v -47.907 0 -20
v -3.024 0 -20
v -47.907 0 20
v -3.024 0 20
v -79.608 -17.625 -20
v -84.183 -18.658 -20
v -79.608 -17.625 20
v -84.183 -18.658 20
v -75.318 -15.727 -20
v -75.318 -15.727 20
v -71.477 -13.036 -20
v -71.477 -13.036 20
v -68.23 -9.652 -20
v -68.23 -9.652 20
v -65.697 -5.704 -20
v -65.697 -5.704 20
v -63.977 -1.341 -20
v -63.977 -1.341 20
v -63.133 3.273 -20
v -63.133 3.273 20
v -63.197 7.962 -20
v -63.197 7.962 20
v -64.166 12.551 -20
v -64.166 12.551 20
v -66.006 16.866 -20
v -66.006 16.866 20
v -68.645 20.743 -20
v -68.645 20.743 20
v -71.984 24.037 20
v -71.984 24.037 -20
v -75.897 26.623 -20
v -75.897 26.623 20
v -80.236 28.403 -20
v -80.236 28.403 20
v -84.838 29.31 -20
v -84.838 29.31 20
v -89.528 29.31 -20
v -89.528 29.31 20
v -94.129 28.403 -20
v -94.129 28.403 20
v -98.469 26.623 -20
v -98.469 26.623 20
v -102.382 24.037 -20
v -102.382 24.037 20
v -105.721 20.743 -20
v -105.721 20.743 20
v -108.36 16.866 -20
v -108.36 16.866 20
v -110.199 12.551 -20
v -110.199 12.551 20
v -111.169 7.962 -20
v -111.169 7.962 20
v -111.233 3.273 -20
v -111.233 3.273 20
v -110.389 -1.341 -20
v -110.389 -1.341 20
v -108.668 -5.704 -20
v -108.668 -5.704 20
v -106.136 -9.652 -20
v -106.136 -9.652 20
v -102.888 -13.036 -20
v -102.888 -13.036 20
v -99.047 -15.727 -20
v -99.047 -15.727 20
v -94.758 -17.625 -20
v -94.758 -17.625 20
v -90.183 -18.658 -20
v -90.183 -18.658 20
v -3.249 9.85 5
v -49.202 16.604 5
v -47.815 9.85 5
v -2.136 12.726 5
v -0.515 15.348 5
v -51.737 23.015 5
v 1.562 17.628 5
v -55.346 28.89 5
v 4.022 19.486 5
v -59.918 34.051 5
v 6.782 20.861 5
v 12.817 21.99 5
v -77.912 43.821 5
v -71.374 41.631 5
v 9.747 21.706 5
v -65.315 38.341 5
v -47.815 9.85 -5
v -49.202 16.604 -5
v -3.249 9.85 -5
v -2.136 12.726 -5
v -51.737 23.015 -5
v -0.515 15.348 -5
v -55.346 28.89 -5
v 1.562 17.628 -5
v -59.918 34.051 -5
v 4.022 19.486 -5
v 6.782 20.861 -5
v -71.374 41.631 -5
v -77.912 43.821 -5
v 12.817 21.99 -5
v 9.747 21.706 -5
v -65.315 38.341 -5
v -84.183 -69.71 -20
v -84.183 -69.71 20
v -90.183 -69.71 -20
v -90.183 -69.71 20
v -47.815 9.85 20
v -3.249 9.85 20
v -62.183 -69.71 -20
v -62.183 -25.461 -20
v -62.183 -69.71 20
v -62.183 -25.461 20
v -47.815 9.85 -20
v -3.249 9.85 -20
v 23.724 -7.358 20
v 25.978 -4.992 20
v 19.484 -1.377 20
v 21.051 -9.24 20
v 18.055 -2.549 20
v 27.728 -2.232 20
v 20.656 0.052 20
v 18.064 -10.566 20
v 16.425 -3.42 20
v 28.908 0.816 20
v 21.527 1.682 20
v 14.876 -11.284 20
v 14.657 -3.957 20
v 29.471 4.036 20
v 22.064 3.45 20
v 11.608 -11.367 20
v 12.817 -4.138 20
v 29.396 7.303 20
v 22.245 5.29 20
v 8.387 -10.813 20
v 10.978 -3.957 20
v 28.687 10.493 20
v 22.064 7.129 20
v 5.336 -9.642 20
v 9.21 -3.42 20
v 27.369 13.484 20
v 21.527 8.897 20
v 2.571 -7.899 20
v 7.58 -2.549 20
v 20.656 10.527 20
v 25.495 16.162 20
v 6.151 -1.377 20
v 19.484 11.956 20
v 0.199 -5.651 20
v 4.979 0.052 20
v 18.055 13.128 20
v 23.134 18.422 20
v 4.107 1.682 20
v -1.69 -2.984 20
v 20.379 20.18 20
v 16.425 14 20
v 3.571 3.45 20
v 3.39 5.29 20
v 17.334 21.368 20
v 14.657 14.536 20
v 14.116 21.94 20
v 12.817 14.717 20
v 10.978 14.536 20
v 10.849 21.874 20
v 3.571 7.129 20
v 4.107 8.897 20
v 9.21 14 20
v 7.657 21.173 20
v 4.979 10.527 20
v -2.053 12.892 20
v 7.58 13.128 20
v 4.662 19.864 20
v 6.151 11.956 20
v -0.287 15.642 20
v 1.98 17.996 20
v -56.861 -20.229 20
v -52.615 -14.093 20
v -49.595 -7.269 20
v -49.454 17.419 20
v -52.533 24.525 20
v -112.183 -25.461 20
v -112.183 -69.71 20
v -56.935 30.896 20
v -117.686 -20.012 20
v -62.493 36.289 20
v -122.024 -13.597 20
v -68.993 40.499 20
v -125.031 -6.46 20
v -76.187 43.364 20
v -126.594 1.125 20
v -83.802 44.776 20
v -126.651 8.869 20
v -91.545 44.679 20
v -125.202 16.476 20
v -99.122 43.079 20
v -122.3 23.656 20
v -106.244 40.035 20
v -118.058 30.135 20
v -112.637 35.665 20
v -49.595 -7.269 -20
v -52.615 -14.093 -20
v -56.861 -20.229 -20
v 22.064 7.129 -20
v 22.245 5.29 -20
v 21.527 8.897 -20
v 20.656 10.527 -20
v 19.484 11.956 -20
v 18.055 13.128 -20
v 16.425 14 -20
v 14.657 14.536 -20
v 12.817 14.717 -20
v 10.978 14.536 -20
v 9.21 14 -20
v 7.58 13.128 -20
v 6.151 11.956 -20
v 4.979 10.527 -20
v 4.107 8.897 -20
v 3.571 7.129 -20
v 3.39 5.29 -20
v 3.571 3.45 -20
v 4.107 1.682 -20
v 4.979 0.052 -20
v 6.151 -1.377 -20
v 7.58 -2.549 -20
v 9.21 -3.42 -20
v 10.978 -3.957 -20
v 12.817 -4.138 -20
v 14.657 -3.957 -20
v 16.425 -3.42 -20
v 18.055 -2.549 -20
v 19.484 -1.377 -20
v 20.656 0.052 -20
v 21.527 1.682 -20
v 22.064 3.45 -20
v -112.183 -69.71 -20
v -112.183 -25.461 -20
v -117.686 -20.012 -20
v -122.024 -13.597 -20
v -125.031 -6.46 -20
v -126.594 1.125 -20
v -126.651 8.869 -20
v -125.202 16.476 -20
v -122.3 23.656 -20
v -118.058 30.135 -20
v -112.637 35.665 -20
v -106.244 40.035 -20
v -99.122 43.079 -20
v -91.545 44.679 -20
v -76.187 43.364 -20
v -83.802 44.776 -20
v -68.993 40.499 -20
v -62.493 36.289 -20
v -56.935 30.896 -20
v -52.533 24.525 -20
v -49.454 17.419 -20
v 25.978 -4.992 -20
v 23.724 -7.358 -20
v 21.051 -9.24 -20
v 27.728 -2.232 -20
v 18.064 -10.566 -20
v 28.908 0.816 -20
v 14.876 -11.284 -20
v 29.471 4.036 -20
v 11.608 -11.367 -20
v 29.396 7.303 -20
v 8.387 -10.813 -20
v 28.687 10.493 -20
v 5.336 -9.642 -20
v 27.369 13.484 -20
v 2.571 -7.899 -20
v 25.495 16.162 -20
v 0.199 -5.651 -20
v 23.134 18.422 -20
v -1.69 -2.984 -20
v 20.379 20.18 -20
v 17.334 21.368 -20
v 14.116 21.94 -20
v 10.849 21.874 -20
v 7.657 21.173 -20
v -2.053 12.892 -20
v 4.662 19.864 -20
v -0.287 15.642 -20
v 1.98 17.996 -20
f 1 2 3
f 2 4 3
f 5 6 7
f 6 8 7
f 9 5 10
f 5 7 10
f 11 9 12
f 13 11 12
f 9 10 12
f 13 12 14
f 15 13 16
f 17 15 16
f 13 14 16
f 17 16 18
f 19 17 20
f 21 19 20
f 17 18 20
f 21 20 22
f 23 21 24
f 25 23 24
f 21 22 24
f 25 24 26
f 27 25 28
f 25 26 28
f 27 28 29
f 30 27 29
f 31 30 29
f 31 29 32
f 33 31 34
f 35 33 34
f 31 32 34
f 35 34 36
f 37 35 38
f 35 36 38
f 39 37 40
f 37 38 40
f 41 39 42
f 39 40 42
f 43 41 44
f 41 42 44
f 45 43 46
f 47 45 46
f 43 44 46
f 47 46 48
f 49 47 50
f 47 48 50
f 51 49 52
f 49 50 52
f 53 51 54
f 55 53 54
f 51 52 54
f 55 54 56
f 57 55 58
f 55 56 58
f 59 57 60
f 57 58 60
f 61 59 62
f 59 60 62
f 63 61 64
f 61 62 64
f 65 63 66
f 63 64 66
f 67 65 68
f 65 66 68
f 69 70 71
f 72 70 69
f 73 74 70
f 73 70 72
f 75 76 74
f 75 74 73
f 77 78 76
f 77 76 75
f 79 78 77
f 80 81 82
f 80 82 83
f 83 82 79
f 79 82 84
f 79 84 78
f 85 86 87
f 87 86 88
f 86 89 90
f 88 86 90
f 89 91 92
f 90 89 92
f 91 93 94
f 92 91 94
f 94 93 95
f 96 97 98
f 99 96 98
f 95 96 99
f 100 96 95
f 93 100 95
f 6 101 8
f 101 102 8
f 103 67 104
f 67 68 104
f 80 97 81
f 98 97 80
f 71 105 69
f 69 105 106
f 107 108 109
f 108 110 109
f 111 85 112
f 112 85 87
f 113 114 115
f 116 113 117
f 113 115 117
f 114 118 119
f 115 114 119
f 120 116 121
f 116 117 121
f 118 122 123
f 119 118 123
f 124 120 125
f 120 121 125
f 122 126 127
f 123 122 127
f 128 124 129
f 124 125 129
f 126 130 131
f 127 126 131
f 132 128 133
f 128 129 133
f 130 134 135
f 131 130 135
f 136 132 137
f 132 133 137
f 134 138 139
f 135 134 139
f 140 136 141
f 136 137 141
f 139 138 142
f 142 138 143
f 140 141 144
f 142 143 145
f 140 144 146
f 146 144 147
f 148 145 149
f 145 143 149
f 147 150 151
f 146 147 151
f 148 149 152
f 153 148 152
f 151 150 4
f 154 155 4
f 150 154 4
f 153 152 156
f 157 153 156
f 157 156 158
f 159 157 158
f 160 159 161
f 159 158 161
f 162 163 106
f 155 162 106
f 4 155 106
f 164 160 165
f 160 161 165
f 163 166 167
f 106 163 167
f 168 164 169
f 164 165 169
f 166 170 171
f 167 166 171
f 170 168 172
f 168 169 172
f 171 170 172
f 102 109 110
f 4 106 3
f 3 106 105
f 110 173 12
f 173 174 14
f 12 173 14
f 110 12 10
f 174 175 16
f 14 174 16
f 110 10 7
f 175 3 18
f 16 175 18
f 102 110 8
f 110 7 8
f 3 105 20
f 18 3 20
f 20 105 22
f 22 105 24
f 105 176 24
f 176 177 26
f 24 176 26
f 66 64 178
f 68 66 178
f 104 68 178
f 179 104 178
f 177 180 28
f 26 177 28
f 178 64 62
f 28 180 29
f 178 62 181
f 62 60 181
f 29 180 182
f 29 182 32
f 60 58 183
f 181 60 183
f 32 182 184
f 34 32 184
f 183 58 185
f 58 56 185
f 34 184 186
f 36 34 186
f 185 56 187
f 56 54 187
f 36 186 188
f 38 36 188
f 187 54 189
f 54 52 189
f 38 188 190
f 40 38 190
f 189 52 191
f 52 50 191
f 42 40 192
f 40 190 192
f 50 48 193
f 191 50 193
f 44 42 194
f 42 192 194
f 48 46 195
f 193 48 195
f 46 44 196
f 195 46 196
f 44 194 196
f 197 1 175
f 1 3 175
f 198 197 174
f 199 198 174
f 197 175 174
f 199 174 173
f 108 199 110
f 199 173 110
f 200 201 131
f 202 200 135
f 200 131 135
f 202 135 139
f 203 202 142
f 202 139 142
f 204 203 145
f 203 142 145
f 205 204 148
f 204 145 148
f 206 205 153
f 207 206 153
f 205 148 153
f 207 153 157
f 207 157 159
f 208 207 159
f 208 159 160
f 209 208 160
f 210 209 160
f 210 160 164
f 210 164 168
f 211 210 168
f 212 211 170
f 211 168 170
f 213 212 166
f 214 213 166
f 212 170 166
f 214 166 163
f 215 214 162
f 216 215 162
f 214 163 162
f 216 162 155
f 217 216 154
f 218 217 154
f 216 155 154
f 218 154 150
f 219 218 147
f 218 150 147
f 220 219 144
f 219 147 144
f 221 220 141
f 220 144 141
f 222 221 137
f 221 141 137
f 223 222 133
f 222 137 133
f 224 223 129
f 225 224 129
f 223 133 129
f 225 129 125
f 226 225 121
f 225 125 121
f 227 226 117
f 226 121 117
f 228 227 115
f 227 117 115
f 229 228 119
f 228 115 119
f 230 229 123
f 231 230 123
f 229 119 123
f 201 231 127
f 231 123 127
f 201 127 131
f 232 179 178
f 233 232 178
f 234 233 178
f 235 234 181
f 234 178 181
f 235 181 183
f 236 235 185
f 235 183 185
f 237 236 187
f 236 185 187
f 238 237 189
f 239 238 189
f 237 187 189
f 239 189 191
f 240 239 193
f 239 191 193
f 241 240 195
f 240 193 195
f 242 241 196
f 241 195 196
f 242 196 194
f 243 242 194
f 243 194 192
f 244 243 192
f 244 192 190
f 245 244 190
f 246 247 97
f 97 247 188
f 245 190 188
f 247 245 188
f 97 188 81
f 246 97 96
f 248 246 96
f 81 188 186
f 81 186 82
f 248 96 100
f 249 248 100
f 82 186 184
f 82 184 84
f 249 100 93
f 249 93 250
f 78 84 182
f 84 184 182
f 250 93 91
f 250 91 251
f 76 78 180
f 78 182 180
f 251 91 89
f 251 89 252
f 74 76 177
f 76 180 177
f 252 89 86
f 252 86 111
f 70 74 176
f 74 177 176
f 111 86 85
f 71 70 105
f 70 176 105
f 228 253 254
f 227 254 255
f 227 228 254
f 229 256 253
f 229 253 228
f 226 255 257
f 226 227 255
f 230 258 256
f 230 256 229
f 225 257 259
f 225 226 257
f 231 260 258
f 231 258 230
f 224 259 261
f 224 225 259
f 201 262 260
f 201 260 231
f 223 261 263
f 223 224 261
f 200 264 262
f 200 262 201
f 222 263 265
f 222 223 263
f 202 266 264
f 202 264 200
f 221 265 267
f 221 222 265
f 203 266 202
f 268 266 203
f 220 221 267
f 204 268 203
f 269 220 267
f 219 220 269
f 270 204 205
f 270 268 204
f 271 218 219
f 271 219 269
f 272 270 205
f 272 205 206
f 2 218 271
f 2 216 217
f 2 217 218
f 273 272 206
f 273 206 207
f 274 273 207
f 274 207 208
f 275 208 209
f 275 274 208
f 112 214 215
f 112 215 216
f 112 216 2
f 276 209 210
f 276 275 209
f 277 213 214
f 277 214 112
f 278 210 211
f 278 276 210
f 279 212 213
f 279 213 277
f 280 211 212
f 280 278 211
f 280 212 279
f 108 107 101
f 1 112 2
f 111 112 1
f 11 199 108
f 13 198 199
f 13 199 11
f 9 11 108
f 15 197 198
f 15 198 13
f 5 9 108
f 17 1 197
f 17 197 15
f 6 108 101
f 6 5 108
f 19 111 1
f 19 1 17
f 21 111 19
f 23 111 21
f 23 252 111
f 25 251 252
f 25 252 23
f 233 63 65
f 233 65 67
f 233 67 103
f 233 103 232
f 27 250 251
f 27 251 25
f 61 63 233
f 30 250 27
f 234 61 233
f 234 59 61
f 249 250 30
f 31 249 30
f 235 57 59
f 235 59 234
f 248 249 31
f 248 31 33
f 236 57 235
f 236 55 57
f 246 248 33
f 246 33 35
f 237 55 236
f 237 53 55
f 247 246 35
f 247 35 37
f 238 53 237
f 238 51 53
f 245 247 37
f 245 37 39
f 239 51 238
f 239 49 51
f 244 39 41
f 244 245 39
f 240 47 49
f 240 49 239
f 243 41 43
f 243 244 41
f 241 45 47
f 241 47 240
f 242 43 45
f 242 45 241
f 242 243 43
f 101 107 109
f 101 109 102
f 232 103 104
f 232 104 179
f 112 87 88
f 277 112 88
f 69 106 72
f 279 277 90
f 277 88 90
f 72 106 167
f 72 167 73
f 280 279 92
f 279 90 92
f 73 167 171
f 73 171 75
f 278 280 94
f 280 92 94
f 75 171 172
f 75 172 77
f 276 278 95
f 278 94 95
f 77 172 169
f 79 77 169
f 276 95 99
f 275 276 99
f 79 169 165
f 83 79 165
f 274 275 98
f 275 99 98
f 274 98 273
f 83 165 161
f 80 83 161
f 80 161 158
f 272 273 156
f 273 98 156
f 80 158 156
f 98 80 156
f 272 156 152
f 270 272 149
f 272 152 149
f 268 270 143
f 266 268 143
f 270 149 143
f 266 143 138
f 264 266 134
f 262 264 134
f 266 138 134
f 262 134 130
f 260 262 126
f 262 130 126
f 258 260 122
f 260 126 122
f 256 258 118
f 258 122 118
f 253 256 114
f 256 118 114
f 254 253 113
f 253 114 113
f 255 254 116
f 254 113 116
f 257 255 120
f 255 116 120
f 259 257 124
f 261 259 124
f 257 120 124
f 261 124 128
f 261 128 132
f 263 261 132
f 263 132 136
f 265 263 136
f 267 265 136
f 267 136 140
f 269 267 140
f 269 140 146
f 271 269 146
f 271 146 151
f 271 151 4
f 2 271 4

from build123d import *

# Parameters (mm, degrees)
BOSS_EXTRUDE1_DEPTH = 20
SKETCH2_3_R         = 9.427573189
CUT_EXTRUDE1_DEPTH  = 20
RIB14_REACH         = 148.086
SKETCH4_WALL_W      = 387.490512318
SKETCH4_WALL_H      = 10


with BuildPart() as part:
    # Sketch2 → Boss-Extrude1 (new, symmetric)
    with BuildSketch(Plane.XY):
        with BuildLine():
            Line((-47.815474815, 9.850065555), (-3.248646384, 9.850065555))
            ThreePointArc((-3.248646384, 9.850065555), (29.513615172, 5.671147892), (-3.023551525, 0))
            Line((-3.023551525, 0), (-47.906799475, 0))
            ThreePointArc((-47.906799475, 0), (-52.615248836, -14.092543666), (-62.182699169, -25.460620745))
            Line((-62.182699169, -25.460620745), (-62.182699169, -69.710398251))
            Line((-62.182699169, -69.710398251), (-84.182699169, -69.710398251))
            Line((-84.182699169, -69.710398251), (-84.182699169, -18.657805359))
            ThreePointArc((-84.182699169, -18.657805359), (-87.182699169, 29.424189114), (-90.182699169, -18.657805359))
            Line((-90.182699169, -18.657805359), (-90.182699169, -69.710398251))
            Line((-90.182699169, -69.710398251), (-112.182699169, -69.710398251))
            Line((-112.182699169, -69.710398251), (-112.182699169, -25.460620745))
            ThreePointArc((-112.182699169, -25.460620745), (-106.243534032, 40.035259864), (-47.815474815, 9.850065555))
        make_face()
    extrude(amount=BOSS_EXTRUDE1_DEPTH, both=True)

    # Sketch2<3> → Cut-Extrude1 (cut, symmetric)
    with BuildSketch(Plane.XY):
        with Locations((12.817300831, 5.289601749)):
            Circle(SKETCH2_3_R)
    extrude(amount=CUT_EXTRUDE1_DEPTH, both=True, mode=Mode.SUBTRACT)

    # Sketch4 wall → Rib14 (add, up to next)
    with BuildSketch(Plane(origin=(-32.547275207, 32.905370949, 0), x_dir=(0.972252919165, -0.233932172167, 0), z_dir=(0.233932172167, 0.972252919165, 0)), mode=Mode.PRIVATE) as rib14_sk1:
        Rectangle(SKETCH4_WALL_W, SKETCH4_WALL_H)
    rib14_tool1 = extrude(rib14_sk1.sketch, amount=-RIB14_REACH, mode=Mode.PRIVATE) - part.part
    add(rib14_tool1.solids().sort_by_distance((-32.547275207, 32.905370949, 0))[0])


solid = part.part
